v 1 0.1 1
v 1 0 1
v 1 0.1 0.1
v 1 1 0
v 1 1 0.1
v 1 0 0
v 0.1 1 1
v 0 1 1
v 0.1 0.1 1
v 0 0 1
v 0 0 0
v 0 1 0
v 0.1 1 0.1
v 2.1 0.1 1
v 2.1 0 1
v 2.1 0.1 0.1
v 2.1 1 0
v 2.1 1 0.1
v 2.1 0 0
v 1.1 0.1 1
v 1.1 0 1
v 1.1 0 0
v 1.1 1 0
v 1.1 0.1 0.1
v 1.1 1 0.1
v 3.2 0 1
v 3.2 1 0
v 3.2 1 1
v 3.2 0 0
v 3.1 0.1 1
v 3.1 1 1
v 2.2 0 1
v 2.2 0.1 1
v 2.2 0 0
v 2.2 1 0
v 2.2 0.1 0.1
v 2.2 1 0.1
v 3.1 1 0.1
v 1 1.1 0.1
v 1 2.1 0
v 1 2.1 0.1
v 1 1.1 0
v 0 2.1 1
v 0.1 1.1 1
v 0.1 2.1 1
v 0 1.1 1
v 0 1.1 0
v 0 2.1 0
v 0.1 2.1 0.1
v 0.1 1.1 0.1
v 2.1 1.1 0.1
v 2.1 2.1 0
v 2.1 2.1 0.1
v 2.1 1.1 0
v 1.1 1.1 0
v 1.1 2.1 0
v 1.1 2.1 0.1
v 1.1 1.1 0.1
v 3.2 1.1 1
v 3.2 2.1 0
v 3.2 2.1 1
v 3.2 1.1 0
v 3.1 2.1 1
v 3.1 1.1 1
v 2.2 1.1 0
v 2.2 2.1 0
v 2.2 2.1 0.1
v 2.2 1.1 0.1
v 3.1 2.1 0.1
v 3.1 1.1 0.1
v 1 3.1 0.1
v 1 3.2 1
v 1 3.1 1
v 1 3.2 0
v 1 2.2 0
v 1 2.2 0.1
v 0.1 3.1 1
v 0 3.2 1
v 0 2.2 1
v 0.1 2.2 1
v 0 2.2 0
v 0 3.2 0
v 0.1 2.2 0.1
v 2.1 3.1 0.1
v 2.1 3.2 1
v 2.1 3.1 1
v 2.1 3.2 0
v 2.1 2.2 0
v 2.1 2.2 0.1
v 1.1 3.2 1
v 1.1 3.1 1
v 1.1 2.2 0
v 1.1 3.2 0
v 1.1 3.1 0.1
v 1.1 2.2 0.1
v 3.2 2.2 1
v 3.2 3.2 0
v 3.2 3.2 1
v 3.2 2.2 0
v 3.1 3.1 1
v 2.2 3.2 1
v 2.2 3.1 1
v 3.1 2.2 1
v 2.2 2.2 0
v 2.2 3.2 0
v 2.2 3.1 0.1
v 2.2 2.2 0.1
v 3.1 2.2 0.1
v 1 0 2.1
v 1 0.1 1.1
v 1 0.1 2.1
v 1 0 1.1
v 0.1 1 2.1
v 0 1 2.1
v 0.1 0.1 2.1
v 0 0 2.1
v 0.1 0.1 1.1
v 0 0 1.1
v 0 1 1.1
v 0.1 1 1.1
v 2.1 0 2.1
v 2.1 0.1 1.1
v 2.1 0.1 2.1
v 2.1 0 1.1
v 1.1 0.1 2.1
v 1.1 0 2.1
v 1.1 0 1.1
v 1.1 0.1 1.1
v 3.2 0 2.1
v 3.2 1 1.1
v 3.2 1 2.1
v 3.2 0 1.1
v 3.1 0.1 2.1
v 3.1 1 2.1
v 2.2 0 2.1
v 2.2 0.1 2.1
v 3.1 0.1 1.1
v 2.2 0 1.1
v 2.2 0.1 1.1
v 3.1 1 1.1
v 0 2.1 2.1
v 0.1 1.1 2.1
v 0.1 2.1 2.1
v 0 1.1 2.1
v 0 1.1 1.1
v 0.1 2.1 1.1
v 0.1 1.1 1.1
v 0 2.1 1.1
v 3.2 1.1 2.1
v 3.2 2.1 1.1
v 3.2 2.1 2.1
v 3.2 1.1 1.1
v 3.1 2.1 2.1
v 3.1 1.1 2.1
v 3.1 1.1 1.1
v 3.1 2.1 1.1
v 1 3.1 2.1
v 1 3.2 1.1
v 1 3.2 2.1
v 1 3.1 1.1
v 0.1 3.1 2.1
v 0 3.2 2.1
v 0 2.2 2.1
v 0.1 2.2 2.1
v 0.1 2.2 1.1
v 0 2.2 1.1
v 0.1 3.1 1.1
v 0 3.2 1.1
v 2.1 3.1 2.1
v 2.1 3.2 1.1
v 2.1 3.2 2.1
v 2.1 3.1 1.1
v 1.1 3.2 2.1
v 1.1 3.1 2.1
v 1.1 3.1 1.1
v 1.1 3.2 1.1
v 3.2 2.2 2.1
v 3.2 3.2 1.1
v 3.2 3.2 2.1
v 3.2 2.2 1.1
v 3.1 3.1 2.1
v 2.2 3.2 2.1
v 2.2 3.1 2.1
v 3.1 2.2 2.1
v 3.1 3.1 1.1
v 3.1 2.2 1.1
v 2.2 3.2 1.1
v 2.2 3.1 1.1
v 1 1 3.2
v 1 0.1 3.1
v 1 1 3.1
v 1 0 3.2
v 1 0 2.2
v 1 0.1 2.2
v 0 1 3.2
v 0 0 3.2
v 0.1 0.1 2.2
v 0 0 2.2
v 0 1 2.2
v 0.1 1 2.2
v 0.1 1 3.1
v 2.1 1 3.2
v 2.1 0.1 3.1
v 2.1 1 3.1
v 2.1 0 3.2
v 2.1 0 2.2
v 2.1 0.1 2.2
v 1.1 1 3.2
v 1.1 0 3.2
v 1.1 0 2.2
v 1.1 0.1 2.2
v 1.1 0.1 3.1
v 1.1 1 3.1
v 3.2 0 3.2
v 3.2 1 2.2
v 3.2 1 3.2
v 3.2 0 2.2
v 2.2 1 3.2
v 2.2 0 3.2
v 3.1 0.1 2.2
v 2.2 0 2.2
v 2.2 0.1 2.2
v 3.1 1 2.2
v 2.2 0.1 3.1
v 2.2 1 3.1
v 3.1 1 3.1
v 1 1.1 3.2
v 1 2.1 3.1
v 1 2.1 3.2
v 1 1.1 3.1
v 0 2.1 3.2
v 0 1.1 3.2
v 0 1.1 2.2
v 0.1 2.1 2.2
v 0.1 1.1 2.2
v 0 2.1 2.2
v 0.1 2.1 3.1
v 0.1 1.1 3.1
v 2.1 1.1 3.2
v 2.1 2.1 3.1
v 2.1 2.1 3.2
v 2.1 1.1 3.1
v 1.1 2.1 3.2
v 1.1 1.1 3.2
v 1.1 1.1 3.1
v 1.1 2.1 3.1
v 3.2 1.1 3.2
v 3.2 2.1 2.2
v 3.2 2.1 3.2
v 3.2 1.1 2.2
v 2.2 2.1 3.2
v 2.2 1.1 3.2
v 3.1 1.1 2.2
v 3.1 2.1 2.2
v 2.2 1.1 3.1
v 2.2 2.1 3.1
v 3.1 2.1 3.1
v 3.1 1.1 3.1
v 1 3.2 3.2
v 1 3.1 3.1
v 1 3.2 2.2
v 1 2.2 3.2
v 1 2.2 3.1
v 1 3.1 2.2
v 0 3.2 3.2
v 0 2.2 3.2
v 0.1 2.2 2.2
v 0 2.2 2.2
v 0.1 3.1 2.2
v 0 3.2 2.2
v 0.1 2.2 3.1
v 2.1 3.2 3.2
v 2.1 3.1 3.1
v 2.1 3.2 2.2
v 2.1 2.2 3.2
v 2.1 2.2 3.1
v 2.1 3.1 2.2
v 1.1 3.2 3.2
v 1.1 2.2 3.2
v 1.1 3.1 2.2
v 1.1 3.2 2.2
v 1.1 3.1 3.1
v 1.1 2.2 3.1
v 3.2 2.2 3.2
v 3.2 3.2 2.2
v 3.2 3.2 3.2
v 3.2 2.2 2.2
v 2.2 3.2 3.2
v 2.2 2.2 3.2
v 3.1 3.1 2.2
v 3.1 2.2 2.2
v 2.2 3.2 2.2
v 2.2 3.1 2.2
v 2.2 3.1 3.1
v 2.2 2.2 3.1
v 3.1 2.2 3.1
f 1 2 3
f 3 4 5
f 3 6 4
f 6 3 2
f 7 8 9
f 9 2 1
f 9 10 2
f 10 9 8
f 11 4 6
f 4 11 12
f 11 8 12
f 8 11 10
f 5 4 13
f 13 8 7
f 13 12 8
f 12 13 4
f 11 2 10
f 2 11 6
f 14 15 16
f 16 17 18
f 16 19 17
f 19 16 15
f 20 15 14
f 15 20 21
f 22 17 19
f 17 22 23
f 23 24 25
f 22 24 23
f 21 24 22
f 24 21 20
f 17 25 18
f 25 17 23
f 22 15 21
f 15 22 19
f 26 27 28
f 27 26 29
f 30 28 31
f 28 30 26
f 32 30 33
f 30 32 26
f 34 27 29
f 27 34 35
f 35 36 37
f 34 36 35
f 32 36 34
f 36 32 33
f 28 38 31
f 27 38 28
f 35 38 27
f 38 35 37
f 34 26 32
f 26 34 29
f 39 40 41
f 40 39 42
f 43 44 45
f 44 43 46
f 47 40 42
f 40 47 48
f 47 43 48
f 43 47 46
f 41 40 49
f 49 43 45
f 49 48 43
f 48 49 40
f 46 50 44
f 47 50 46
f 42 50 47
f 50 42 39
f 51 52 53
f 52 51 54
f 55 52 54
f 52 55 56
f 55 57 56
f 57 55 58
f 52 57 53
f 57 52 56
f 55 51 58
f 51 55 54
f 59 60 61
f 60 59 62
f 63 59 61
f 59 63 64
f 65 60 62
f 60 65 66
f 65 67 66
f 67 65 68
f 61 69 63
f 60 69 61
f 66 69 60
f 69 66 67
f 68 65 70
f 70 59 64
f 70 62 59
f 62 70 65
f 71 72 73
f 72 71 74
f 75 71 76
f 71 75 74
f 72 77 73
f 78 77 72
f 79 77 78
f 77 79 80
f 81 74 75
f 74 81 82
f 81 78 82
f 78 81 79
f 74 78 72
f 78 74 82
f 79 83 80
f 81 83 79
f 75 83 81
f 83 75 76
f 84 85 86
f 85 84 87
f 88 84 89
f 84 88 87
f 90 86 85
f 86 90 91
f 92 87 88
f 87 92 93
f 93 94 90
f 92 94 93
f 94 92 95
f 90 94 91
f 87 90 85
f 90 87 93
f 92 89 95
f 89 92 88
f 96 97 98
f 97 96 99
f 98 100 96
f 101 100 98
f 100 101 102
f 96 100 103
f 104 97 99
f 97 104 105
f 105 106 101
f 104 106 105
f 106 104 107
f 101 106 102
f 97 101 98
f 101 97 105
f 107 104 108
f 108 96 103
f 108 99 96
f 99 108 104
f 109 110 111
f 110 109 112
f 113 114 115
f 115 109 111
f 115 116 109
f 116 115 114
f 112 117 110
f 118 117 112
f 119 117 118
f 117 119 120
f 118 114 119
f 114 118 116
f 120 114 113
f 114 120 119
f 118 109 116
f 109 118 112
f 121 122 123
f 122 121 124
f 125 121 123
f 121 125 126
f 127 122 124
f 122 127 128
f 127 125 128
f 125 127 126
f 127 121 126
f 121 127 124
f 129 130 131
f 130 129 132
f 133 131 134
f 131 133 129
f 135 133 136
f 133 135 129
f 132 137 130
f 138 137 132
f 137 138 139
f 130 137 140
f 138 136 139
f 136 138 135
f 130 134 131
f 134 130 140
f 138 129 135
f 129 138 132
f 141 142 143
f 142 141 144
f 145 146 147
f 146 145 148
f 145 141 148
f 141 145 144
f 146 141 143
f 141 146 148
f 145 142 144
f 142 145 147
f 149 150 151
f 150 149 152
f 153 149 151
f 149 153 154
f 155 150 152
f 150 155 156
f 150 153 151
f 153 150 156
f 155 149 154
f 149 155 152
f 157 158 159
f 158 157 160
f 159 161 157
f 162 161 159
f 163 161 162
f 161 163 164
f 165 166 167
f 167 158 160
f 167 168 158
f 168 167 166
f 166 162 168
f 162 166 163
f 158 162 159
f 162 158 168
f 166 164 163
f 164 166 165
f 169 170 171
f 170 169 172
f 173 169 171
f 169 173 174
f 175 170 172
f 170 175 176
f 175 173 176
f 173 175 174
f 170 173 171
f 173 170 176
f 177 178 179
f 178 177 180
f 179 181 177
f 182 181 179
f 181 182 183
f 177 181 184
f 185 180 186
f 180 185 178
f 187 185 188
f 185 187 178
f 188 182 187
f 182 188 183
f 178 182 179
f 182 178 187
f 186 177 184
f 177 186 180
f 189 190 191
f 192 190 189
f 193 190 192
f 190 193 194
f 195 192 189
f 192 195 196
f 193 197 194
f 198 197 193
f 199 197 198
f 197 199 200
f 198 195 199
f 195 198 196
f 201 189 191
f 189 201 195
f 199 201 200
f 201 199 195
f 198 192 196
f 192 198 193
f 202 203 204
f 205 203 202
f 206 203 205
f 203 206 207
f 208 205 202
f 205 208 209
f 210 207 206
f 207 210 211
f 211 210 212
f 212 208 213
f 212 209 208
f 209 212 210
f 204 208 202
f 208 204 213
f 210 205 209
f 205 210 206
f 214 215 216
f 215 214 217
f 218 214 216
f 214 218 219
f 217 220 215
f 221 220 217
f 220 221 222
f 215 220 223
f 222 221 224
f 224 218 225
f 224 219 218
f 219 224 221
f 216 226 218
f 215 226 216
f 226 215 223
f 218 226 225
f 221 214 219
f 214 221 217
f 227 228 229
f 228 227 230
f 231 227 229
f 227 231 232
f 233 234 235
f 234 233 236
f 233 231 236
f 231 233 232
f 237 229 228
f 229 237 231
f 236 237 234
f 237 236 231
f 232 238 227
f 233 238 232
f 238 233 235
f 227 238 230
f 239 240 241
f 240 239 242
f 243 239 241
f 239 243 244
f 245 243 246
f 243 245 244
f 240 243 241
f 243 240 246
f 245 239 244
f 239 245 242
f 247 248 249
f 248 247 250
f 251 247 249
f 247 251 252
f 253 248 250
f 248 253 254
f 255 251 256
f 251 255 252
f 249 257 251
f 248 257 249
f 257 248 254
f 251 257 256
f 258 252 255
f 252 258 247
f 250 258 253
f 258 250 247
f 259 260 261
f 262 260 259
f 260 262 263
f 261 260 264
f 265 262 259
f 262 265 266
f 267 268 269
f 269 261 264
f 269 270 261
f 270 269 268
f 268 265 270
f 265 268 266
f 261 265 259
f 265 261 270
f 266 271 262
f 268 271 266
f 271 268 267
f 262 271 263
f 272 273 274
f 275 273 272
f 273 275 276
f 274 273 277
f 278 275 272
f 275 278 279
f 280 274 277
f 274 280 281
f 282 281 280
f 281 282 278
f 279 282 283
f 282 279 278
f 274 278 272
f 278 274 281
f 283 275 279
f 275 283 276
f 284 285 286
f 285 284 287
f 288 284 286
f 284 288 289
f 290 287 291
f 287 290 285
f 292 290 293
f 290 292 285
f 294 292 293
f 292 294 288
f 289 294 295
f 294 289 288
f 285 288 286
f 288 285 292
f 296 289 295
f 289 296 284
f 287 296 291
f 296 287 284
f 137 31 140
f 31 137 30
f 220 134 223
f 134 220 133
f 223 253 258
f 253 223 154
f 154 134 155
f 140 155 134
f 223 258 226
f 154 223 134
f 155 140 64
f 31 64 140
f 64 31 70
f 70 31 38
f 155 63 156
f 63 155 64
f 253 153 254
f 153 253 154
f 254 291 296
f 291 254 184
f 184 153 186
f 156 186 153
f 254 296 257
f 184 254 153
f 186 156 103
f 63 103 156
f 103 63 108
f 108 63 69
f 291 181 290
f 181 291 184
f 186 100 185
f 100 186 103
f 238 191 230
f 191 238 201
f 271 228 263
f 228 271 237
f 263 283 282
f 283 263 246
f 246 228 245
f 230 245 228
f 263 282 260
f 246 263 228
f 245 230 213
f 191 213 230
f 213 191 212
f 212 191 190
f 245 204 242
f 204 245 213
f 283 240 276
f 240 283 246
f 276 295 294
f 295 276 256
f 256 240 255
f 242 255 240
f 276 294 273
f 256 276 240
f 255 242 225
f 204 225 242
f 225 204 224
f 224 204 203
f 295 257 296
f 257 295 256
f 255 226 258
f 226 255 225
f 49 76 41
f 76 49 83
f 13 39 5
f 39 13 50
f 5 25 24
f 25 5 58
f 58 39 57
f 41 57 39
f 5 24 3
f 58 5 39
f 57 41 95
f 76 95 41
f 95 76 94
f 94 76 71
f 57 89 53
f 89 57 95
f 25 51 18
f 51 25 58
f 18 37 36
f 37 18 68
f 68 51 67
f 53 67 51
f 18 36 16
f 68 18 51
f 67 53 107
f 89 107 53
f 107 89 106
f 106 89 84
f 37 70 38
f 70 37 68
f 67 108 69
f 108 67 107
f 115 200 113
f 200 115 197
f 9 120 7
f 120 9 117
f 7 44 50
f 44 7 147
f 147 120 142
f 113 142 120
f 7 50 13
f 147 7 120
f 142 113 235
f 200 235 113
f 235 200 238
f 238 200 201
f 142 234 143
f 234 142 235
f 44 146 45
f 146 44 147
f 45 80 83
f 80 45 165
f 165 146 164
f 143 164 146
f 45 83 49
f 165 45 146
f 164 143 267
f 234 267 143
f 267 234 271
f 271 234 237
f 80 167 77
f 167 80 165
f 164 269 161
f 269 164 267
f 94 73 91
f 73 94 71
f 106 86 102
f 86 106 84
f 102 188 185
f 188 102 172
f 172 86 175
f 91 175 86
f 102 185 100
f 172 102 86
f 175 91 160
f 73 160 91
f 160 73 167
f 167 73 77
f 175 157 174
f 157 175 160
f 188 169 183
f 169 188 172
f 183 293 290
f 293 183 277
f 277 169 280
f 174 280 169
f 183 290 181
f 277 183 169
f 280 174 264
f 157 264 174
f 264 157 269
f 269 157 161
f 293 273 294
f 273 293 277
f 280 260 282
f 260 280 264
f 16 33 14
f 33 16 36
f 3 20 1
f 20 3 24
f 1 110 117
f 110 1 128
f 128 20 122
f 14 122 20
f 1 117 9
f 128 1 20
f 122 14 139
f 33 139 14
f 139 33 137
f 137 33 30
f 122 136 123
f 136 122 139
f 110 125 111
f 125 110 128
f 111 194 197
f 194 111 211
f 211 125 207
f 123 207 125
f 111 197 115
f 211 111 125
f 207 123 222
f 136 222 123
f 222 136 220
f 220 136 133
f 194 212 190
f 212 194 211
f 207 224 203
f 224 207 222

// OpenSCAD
// [FL_INDEX: keywords="openscad, 3d_parametric, Cuisenare_Set_Generator_with_Inset_-_Math_Manipulatives, csg_solid" | COT="Parametric OpenSCAD design from 3DCodeverse"]
// Title: Cuisenare Set Generator with Inset - Math Manipulatives

//Cube Generator with Inset
//created 2013-11-18
//collaboration between Jonathan Schmid (@schmidjon and Michael Frey (@ChickenCutlass)

//variables, whole numbers only

// Cube Size
cube_size = 2; //[0, 1, 2, 3]
// Number of Cubes in X Axis (whole numbers only)
x_var = 3;
// Number of Cubes in Y Axis (whole numbers only)
y_var= 3;
// Number of Cubes in z Axis (whole numbers only)
z = 3;
// Inset amount
inset = .1; //[.1,.2,.3,.4,.5,.6,.7]

// create inner cube with insets on all sides
translate([inset,inset,inset]){
cube([x_var+(inset*(x_var-1))-(inset*2),y_var+(inset*(y_var-1))-(inset*2),z+(inset*(z-1))-(inset*2)]);
}

//create grid of cubes

for ( z = [0:z-1]) {
	for ( x = [0:y_var-1]) {
		for ( i = [0:x_var-1]) {
			translate([i*(1+inset),x*(1+inset),z*(1+inset)]) {
				cube([cube_size]);
			}
		}
	}
}
